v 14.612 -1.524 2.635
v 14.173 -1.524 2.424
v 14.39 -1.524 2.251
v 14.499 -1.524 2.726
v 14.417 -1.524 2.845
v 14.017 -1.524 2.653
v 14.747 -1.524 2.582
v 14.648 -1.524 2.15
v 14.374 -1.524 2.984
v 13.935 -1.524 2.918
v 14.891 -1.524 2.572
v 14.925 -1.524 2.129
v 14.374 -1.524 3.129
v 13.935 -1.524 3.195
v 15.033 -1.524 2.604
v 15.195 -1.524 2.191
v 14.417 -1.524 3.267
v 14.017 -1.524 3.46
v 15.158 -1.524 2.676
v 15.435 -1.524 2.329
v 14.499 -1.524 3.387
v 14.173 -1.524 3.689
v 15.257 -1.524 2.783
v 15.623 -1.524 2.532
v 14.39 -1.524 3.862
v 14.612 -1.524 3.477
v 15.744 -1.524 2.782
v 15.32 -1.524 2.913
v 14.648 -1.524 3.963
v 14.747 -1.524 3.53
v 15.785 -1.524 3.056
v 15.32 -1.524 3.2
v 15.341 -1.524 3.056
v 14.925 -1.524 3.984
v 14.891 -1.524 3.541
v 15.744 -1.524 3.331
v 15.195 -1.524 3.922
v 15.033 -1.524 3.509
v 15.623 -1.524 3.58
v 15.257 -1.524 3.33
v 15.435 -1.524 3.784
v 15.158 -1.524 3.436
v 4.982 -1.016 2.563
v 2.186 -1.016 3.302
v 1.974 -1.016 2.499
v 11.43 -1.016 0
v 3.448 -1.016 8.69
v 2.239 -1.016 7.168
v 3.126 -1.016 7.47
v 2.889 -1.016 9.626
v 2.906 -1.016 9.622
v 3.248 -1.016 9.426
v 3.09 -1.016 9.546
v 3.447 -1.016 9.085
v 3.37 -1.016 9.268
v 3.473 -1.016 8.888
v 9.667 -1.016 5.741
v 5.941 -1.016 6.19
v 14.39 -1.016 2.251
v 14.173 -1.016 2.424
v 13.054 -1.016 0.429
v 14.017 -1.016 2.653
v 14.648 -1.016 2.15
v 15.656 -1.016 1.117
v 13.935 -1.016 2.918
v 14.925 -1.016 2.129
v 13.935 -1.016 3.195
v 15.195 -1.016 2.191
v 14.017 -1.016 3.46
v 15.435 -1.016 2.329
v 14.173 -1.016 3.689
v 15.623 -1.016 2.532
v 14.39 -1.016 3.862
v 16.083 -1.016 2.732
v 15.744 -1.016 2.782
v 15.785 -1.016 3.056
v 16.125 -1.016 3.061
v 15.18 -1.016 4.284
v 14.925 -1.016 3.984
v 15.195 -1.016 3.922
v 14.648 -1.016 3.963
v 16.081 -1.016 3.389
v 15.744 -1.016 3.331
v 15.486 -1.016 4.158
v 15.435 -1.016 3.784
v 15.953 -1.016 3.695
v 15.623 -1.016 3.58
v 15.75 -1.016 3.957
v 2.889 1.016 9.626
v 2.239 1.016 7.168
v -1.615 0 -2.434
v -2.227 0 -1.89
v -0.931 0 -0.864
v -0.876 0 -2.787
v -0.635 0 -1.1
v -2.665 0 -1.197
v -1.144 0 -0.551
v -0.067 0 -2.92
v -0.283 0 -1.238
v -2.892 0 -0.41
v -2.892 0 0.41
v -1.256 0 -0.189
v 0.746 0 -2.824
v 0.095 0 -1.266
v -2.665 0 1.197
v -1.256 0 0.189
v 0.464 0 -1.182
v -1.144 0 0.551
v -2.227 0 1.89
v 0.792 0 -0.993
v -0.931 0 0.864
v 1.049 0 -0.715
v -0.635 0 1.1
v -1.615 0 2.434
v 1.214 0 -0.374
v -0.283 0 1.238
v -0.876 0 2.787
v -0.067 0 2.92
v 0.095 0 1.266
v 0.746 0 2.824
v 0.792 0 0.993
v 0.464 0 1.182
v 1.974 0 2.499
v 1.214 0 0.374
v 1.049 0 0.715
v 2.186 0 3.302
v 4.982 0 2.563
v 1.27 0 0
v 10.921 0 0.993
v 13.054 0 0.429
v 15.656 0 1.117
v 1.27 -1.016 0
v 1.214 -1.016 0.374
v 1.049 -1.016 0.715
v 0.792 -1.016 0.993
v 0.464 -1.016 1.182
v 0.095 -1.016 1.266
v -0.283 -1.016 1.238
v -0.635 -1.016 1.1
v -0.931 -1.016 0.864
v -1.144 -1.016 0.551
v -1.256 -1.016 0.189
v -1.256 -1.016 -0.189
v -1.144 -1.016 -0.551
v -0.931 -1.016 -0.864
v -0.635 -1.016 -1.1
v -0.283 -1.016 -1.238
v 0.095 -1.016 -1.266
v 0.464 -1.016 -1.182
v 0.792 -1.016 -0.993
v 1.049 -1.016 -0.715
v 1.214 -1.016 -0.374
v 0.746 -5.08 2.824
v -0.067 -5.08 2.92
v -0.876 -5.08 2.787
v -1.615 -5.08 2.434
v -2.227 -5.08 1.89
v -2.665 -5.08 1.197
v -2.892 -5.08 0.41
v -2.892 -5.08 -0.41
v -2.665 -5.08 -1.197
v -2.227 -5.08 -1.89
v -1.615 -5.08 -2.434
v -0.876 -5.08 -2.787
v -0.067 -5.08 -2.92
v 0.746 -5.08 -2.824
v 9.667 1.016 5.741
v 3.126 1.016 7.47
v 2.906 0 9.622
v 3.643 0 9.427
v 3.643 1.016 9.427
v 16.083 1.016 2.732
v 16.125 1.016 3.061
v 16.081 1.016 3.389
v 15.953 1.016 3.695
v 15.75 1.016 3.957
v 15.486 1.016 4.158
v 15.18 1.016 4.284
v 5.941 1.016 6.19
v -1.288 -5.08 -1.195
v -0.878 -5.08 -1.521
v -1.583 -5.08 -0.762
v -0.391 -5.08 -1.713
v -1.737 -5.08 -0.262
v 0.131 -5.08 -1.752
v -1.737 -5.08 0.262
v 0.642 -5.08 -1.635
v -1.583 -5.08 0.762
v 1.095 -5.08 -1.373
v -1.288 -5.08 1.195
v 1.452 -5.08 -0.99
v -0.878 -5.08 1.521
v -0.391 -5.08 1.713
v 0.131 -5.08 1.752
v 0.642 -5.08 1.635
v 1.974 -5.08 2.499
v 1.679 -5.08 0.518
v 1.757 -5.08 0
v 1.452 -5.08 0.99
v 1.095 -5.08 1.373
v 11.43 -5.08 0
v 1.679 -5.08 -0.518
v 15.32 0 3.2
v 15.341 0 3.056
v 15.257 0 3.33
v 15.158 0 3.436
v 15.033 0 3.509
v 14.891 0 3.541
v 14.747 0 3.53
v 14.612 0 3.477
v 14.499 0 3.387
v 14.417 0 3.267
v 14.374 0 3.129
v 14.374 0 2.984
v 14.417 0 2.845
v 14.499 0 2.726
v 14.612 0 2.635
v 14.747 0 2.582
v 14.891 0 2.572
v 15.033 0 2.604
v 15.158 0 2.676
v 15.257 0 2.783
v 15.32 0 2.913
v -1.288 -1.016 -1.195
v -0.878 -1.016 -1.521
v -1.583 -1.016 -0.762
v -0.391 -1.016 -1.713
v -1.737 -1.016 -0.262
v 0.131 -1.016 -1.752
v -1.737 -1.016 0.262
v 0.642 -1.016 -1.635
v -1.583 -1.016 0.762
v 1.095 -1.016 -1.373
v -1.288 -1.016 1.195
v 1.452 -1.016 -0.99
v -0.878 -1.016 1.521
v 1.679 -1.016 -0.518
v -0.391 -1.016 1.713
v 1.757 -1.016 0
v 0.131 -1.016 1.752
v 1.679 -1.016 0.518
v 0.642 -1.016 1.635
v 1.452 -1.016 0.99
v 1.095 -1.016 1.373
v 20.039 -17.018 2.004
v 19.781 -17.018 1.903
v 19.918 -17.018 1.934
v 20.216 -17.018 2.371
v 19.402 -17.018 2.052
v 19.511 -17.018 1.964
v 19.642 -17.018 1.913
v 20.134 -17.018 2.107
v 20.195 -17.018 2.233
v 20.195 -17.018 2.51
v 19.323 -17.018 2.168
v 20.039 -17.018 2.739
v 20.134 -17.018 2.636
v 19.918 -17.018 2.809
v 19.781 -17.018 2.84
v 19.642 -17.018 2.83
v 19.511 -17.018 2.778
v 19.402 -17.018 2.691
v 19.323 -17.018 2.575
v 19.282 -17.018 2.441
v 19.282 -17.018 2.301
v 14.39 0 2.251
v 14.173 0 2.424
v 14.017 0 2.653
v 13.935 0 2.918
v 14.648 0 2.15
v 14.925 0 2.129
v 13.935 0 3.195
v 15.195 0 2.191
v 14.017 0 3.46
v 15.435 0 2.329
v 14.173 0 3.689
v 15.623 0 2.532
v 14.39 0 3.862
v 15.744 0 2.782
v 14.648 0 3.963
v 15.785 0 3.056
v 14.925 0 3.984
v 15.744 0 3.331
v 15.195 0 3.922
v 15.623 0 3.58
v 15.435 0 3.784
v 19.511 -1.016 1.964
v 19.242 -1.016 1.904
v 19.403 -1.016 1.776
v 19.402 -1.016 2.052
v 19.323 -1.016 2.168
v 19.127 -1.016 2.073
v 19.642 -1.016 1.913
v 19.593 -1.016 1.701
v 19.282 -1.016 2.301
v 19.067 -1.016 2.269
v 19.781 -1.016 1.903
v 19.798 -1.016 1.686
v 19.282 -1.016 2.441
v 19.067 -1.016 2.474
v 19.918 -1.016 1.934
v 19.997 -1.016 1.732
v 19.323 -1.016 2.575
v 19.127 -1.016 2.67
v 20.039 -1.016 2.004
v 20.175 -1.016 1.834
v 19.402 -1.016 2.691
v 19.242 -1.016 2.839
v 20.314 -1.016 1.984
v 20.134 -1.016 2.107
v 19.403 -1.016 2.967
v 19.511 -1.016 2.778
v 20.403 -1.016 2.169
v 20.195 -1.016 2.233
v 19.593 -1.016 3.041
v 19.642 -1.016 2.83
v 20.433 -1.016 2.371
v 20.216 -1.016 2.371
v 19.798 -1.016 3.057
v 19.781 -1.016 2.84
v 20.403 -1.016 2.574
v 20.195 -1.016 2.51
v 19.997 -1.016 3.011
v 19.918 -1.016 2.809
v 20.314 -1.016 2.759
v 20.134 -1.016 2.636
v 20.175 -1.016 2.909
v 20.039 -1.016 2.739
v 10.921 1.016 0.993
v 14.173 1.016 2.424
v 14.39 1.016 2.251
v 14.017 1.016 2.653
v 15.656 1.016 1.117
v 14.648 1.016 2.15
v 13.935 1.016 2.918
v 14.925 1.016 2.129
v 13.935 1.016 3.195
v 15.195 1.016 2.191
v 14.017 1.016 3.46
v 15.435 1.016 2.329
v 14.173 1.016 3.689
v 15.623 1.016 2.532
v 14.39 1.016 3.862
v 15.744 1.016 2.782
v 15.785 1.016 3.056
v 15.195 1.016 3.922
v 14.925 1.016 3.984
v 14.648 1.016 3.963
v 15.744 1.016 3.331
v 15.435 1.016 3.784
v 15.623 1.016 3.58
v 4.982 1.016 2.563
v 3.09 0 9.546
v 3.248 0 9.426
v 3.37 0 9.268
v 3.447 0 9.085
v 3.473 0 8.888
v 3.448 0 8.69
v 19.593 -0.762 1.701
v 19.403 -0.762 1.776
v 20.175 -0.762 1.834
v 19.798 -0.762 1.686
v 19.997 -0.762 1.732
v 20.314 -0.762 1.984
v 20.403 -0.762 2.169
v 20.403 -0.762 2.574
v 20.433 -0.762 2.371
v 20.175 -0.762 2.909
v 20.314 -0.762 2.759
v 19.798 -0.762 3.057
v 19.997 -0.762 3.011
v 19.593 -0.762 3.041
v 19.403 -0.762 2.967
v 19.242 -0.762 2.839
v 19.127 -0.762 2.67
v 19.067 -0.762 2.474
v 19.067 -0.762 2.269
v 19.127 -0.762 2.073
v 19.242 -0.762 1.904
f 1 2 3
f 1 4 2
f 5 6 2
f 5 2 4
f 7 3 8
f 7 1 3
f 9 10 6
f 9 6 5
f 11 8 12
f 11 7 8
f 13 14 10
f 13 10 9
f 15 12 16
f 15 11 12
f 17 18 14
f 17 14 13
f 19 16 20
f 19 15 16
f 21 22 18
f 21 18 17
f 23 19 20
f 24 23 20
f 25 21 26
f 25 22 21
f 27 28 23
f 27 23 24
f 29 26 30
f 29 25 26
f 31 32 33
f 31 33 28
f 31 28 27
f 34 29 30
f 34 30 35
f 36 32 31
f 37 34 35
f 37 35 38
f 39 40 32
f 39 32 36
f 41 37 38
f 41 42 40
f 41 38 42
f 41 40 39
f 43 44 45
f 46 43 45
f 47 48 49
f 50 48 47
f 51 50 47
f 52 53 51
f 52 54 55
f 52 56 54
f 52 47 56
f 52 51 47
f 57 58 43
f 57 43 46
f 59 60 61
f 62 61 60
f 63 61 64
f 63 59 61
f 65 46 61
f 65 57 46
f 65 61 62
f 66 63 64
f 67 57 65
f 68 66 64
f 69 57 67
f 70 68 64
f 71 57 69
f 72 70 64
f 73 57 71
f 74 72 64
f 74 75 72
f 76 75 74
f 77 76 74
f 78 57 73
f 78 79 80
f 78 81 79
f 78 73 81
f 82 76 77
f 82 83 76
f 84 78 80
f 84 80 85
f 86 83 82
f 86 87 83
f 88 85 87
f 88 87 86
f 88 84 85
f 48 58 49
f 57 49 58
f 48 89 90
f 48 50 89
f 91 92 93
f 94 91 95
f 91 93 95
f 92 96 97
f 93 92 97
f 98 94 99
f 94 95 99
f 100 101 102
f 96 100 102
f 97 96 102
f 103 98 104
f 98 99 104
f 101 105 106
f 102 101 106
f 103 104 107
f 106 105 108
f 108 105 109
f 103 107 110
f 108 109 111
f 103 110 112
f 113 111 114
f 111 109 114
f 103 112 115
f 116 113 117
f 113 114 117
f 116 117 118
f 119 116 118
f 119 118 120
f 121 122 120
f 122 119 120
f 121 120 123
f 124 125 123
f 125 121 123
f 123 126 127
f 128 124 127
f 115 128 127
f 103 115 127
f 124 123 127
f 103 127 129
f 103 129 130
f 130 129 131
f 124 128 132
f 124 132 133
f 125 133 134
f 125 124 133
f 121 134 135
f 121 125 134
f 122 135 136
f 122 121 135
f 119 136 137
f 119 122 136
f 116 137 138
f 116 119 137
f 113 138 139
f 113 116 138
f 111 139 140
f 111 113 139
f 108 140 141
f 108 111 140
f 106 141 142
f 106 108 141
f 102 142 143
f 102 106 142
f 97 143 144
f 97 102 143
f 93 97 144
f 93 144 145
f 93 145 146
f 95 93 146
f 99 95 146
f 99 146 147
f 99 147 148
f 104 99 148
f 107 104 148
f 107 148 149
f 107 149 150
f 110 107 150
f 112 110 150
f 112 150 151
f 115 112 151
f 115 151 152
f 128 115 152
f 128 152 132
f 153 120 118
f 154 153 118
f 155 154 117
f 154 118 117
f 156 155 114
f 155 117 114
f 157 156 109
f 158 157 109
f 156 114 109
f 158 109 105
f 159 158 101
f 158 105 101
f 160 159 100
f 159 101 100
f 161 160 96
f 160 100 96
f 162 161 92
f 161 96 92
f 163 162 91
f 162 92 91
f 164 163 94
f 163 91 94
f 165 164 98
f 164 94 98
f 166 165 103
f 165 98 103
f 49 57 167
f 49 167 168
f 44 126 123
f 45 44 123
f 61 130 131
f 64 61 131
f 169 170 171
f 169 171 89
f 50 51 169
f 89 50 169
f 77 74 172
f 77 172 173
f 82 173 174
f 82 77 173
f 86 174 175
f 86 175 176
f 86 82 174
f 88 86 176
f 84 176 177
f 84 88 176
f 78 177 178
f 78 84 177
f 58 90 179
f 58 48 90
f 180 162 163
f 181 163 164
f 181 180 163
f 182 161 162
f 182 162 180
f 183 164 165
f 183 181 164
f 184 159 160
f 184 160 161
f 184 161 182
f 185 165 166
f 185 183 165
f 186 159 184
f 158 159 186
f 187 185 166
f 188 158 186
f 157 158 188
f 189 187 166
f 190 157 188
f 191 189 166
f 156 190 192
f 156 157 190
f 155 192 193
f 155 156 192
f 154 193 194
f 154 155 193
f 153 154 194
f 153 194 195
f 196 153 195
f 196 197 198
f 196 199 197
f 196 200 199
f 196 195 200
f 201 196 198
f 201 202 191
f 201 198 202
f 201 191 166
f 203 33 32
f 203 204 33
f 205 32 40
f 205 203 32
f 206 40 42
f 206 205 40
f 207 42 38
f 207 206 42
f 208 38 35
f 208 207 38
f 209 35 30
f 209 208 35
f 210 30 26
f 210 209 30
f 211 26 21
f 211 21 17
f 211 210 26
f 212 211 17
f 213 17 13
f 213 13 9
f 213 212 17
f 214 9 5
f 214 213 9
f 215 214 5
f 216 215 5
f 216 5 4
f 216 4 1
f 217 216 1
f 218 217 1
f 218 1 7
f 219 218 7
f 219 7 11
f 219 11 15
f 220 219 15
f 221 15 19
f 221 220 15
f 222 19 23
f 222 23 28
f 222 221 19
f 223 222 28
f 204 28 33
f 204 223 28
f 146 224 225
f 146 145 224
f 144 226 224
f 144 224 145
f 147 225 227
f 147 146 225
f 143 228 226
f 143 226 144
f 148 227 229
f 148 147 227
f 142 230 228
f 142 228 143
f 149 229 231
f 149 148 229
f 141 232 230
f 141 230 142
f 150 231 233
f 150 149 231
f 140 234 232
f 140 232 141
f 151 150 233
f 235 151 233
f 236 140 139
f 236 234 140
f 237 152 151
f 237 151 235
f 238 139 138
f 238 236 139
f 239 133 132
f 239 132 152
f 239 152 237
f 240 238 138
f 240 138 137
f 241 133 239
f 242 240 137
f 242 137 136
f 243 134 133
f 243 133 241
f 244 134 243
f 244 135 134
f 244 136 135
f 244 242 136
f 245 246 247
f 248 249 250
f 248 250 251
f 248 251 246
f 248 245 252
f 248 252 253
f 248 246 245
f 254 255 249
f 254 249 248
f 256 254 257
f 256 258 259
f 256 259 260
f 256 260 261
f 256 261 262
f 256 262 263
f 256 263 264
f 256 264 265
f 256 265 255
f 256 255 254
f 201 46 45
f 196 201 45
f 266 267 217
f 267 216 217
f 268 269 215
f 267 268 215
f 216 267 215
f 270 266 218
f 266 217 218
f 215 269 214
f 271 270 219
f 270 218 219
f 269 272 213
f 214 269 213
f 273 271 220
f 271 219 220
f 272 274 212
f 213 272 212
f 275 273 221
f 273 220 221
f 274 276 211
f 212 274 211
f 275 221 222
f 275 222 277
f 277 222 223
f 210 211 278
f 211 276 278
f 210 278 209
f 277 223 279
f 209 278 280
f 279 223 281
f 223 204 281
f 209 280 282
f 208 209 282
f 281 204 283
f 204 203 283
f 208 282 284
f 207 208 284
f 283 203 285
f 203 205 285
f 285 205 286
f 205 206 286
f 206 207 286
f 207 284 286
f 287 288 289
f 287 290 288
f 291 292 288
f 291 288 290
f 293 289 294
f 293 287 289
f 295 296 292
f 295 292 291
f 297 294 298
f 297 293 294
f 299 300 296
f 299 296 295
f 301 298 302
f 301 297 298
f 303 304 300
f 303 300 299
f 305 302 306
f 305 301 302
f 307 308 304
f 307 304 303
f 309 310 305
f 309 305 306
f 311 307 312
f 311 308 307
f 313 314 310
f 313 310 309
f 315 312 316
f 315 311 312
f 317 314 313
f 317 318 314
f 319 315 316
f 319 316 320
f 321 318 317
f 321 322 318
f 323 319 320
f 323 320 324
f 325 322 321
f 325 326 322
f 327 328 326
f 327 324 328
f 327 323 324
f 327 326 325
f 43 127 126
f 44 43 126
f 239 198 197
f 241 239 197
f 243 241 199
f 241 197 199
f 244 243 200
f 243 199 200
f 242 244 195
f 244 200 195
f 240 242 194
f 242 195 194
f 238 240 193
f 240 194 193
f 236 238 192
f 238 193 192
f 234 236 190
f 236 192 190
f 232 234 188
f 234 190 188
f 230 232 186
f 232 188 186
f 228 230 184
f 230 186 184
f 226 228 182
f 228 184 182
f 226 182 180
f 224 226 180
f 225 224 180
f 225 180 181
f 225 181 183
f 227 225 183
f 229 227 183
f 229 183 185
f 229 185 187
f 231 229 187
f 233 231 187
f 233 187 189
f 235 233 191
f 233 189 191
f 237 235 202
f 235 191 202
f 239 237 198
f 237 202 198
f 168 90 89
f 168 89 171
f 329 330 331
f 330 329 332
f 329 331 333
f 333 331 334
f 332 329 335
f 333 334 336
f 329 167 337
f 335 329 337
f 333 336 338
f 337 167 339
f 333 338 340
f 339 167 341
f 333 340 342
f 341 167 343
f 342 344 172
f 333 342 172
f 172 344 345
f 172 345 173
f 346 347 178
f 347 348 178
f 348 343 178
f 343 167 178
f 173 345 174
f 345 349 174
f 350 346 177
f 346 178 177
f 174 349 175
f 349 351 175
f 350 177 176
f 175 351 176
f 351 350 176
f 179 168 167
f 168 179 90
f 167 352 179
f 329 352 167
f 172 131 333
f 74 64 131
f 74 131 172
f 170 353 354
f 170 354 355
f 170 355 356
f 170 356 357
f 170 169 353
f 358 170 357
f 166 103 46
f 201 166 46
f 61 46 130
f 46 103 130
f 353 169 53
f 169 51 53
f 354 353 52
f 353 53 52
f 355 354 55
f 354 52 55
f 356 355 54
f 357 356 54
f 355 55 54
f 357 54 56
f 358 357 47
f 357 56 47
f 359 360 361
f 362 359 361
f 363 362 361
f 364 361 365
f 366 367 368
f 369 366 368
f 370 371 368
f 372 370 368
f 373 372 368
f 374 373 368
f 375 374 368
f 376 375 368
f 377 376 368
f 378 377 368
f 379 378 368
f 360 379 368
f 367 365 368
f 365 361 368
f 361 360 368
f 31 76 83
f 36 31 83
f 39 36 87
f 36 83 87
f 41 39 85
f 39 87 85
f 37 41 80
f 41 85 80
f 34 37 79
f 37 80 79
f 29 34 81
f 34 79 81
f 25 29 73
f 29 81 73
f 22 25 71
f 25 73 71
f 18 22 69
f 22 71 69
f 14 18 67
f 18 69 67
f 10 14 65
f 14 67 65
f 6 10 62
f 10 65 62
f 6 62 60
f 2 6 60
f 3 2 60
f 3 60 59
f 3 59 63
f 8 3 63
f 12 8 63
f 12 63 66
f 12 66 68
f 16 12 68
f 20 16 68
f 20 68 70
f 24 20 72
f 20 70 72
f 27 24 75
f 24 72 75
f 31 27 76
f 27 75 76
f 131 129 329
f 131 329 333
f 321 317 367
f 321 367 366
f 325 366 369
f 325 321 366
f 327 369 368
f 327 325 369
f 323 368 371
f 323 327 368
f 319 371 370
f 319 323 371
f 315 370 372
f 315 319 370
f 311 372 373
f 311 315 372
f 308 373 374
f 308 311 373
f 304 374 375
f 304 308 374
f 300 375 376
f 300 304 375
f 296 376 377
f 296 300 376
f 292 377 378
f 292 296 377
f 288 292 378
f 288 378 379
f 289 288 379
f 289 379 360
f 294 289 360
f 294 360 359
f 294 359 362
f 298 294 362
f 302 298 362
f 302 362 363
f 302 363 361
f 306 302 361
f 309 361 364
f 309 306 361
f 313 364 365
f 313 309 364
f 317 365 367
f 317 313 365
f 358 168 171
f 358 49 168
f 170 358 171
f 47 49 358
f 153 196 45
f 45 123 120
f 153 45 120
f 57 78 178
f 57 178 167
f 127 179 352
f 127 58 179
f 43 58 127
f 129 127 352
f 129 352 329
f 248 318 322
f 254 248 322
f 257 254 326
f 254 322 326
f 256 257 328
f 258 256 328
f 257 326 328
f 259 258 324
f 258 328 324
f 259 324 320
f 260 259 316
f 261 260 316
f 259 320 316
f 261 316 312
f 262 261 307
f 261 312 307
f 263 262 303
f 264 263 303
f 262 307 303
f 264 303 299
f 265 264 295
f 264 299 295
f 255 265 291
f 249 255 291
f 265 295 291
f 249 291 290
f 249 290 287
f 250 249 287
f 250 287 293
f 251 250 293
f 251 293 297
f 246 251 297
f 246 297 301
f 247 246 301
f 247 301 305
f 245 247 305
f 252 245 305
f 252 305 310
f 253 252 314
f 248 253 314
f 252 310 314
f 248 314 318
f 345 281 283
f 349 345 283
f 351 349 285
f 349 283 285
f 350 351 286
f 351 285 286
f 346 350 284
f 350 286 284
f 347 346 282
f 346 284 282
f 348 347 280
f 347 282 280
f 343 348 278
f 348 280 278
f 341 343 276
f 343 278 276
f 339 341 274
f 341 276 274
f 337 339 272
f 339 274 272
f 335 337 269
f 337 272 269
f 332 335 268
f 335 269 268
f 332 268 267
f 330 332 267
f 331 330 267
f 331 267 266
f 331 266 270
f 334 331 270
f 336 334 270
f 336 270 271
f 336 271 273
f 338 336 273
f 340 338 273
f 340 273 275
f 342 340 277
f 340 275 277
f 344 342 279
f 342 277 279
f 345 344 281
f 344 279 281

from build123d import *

# Parameters (mm, degrees)
F0_R      = 1.7567686569
F0_R_2    = 1.27
F1_DEPTH  = 5.08
F2_R      = 1.7567686569
F2_R_2    = 1.27
F3_DEPTH  = 4.064
F4_DEPTH  = 1.016
F0_R_3    = 0.9300746286
F0_R_4    = 0.4860685378
F5_DEPTH  = 1.016
F6_R      = 0.762
F7_R      = 0.9300746286
F7_R_2    = 0.4860685378
F8_DEPTH  = 0.508
F9_R      = 0.9300746286
F10_DEPTH = 1.016
F11_R     = 0.4699
F12_DEPTH = 16.002
F11_R_2   = 0.6872139148
F13_DEPTH = 0.254


with BuildPart() as f1:
    # F0 (on Front) → F1 (new body)
    with BuildSketch(Plane.XZ):
        with BuildLine():
            ThreePointArc((0.7464777778, -2.8240063611), (2.314379246, -1.782102608), (2.921, 0))
            ThreePointArc((2.921, 0), (2.314379246, 1.782102608), (0.7464777778, 2.8240063611))
            ThreePointArc((0.7464777778, 2.8240063611), (-2.921, 0), (0.7464777778, -2.8240063611))
        make_face()
        Circle(F0_R, mode=Mode.SUBTRACT)
        with BuildLine():
            ThreePointArc((0.7464777778, 2.8240063611), (2.314379246, 1.782102608), (2.921, 0))
            ThreePointArc((2.921, 0), (2.314379246, -1.782102608), (0.7464777778, -2.8240063611))
            Line((0.7464777778, -2.8240063611), (11.43, 0))
            Line((11.43, 0), (1.9743066304, 2.4994508055))
            Line((1.9743066304, 2.4994508055), (0.7464777778, 2.8240063611))
        make_face()
        Circle(F0_R)
        Circle(F0_R_2, mode=Mode.SUBTRACT)
    extrude(amount=F1_DEPTH)

    # F2 (on face) → F3 (cut)
    with BuildSketch(Plane.XZ.offset(5.08)):
        Circle(F2_R)
        Circle(F2_R_2, mode=Mode.SUBTRACT)
    extrude(amount=-F3_DEPTH, mode=Mode.SUBTRACT)

    # F0 (on Front) → F4 (join)
    with BuildSketch(Plane.XZ):
        Polygon((2.1864742005, 3.3021037248), (1.9743066304, 2.4994508055), (11.43, 0), (13.0543452908, 0.4293678937), (4.9820835702, 2.563132206), align=None)
    extrude(amount=F4_DEPTH)

    # F0 (on Front) → F5 (join)
    with BuildSketch(Plane.XZ):
        with BuildLine():
            Line((4.9820835702, 2.563132206), (13.0543452908, 0.4293678937))
            Line((13.0543452908, 0.4293678937), (15.6560332857, 1.1170796141))
            Line((15.6560332857, 1.1170796141), (16.082858903, 2.7318071978))
            ThreePointArc((16.082858903, 2.7318071978), (15.9527315924, 3.695073427), (15.179585606, 4.284191606))
            Line((15.179585606, 4.284191606), (9.6670175249, 5.7413446874))
            Line((9.6670175249, 5.7413446874), (3.1256630132, 7.4704398647))
            Line((3.1256630132, 7.4704398647), (3.6428297398, 9.4269376588))
            Line((3.6428297398, 9.4269376588), (2.8890208753, 9.6261941385))
            Line((2.8890208753, 9.6261941385), (2.2392912403, 7.16819649))
            Line((2.2392912403, 7.16819649), (5.9407272542, 6.1897851917))
            Line((5.9407272542, 6.1897851917), (4.9820835702, 2.563132206))
        make_face()
        with Locations((14.8550300504, 3.0563627533)):
            Circle(F0_R_3, mode=Mode.SUBTRACT)
        with Locations((14.8550300504, 3.0563627533)):
            Circle(F0_R_3)
        with Locations((14.8550300504, 3.0563627533)):
            Circle(F0_R_4, mode=Mode.SUBTRACT)
    extrude(amount=F5_DEPTH)

    # F6
    f6_edges = [f1.edges().sort_by_distance(p)[0] for p in [
        (3.64283, -0.508, 9.426938),
    ]]
    fillet(f6_edges, radius=F6_R)

    # F7 (on face) → F8 (join)
    with BuildSketch(Plane.XZ.offset(1.016)):
        with Locations((14.8550300504, 3.0563627533)):
            Circle(F7_R)
        with Locations((14.8550300504, 3.0563627533)):
            Circle(F7_R_2, mode=Mode.SUBTRACT)
    extrude(amount=F8_DEPTH)

    # F9 (on face) → F10 (join)
    with BuildSketch(Plane.XZ):
        with BuildLine():
            Line((4.9820835702, 2.563132206), (10.9209979791, 0.9932817653))
            Line((10.9209979791, 0.9932817653), (15.6560332857, 1.1170796141))
            Line((15.6560332857, 1.1170796141), (16.082858903, 2.7318071978))
            ThreePointArc((16.082858903, 2.7318071978), (15.9527315924, 3.695073427), (15.179585606, 4.284191606))
            Line((15.179585606, 4.284191606), (9.6670175249, 5.7413446874))
            Line((9.6670175249, 5.7413446874), (3.1256630132, 7.4704398647))
            Line((3.1256630132, 7.4704398647), (3.6428297398, 9.4269376588))
            Line((3.6428297398, 9.4269376588), (2.8890208753, 9.6261941385))
            Line((2.8890208753, 9.6261941385), (2.2392912403, 7.16819649))
            Line((2.2392912403, 7.16819649), (5.9407272542, 6.1897851917))
            Line((5.9407272542, 6.1897851917), (4.9820835702, 2.563132206))
        make_face()
        with Locations((14.8550300504, 3.0563627533)):
            Circle(F9_R, mode=Mode.SUBTRACT)
    extrude(amount=-F10_DEPTH)


with BuildPart() as f12:
    # F11 (on face) → F12 (new body)
    with BuildSketch(Plane.XZ.offset(1.016)):
        with Locations((19.7462402284, 2.3714201525)):
            Circle(F11_R)
    extrude(amount=F12_DEPTH)

    # F11 (on face) → F13 (join)
    with BuildSketch(Plane.XZ.offset(1.016)):
        with Locations((19.7462402284, 2.3714201525)):
            Circle(F11_R_2)
        with Locations((19.7462402284, 2.3714201525)):
            Circle(F11_R, mode=Mode.SUBTRACT)
        with Locations((19.7462402284, 2.3714201525)):
            Circle(F11_R)
    extrude(amount=-F13_DEPTH)


solid = Compound([f1.part, f12.part])
